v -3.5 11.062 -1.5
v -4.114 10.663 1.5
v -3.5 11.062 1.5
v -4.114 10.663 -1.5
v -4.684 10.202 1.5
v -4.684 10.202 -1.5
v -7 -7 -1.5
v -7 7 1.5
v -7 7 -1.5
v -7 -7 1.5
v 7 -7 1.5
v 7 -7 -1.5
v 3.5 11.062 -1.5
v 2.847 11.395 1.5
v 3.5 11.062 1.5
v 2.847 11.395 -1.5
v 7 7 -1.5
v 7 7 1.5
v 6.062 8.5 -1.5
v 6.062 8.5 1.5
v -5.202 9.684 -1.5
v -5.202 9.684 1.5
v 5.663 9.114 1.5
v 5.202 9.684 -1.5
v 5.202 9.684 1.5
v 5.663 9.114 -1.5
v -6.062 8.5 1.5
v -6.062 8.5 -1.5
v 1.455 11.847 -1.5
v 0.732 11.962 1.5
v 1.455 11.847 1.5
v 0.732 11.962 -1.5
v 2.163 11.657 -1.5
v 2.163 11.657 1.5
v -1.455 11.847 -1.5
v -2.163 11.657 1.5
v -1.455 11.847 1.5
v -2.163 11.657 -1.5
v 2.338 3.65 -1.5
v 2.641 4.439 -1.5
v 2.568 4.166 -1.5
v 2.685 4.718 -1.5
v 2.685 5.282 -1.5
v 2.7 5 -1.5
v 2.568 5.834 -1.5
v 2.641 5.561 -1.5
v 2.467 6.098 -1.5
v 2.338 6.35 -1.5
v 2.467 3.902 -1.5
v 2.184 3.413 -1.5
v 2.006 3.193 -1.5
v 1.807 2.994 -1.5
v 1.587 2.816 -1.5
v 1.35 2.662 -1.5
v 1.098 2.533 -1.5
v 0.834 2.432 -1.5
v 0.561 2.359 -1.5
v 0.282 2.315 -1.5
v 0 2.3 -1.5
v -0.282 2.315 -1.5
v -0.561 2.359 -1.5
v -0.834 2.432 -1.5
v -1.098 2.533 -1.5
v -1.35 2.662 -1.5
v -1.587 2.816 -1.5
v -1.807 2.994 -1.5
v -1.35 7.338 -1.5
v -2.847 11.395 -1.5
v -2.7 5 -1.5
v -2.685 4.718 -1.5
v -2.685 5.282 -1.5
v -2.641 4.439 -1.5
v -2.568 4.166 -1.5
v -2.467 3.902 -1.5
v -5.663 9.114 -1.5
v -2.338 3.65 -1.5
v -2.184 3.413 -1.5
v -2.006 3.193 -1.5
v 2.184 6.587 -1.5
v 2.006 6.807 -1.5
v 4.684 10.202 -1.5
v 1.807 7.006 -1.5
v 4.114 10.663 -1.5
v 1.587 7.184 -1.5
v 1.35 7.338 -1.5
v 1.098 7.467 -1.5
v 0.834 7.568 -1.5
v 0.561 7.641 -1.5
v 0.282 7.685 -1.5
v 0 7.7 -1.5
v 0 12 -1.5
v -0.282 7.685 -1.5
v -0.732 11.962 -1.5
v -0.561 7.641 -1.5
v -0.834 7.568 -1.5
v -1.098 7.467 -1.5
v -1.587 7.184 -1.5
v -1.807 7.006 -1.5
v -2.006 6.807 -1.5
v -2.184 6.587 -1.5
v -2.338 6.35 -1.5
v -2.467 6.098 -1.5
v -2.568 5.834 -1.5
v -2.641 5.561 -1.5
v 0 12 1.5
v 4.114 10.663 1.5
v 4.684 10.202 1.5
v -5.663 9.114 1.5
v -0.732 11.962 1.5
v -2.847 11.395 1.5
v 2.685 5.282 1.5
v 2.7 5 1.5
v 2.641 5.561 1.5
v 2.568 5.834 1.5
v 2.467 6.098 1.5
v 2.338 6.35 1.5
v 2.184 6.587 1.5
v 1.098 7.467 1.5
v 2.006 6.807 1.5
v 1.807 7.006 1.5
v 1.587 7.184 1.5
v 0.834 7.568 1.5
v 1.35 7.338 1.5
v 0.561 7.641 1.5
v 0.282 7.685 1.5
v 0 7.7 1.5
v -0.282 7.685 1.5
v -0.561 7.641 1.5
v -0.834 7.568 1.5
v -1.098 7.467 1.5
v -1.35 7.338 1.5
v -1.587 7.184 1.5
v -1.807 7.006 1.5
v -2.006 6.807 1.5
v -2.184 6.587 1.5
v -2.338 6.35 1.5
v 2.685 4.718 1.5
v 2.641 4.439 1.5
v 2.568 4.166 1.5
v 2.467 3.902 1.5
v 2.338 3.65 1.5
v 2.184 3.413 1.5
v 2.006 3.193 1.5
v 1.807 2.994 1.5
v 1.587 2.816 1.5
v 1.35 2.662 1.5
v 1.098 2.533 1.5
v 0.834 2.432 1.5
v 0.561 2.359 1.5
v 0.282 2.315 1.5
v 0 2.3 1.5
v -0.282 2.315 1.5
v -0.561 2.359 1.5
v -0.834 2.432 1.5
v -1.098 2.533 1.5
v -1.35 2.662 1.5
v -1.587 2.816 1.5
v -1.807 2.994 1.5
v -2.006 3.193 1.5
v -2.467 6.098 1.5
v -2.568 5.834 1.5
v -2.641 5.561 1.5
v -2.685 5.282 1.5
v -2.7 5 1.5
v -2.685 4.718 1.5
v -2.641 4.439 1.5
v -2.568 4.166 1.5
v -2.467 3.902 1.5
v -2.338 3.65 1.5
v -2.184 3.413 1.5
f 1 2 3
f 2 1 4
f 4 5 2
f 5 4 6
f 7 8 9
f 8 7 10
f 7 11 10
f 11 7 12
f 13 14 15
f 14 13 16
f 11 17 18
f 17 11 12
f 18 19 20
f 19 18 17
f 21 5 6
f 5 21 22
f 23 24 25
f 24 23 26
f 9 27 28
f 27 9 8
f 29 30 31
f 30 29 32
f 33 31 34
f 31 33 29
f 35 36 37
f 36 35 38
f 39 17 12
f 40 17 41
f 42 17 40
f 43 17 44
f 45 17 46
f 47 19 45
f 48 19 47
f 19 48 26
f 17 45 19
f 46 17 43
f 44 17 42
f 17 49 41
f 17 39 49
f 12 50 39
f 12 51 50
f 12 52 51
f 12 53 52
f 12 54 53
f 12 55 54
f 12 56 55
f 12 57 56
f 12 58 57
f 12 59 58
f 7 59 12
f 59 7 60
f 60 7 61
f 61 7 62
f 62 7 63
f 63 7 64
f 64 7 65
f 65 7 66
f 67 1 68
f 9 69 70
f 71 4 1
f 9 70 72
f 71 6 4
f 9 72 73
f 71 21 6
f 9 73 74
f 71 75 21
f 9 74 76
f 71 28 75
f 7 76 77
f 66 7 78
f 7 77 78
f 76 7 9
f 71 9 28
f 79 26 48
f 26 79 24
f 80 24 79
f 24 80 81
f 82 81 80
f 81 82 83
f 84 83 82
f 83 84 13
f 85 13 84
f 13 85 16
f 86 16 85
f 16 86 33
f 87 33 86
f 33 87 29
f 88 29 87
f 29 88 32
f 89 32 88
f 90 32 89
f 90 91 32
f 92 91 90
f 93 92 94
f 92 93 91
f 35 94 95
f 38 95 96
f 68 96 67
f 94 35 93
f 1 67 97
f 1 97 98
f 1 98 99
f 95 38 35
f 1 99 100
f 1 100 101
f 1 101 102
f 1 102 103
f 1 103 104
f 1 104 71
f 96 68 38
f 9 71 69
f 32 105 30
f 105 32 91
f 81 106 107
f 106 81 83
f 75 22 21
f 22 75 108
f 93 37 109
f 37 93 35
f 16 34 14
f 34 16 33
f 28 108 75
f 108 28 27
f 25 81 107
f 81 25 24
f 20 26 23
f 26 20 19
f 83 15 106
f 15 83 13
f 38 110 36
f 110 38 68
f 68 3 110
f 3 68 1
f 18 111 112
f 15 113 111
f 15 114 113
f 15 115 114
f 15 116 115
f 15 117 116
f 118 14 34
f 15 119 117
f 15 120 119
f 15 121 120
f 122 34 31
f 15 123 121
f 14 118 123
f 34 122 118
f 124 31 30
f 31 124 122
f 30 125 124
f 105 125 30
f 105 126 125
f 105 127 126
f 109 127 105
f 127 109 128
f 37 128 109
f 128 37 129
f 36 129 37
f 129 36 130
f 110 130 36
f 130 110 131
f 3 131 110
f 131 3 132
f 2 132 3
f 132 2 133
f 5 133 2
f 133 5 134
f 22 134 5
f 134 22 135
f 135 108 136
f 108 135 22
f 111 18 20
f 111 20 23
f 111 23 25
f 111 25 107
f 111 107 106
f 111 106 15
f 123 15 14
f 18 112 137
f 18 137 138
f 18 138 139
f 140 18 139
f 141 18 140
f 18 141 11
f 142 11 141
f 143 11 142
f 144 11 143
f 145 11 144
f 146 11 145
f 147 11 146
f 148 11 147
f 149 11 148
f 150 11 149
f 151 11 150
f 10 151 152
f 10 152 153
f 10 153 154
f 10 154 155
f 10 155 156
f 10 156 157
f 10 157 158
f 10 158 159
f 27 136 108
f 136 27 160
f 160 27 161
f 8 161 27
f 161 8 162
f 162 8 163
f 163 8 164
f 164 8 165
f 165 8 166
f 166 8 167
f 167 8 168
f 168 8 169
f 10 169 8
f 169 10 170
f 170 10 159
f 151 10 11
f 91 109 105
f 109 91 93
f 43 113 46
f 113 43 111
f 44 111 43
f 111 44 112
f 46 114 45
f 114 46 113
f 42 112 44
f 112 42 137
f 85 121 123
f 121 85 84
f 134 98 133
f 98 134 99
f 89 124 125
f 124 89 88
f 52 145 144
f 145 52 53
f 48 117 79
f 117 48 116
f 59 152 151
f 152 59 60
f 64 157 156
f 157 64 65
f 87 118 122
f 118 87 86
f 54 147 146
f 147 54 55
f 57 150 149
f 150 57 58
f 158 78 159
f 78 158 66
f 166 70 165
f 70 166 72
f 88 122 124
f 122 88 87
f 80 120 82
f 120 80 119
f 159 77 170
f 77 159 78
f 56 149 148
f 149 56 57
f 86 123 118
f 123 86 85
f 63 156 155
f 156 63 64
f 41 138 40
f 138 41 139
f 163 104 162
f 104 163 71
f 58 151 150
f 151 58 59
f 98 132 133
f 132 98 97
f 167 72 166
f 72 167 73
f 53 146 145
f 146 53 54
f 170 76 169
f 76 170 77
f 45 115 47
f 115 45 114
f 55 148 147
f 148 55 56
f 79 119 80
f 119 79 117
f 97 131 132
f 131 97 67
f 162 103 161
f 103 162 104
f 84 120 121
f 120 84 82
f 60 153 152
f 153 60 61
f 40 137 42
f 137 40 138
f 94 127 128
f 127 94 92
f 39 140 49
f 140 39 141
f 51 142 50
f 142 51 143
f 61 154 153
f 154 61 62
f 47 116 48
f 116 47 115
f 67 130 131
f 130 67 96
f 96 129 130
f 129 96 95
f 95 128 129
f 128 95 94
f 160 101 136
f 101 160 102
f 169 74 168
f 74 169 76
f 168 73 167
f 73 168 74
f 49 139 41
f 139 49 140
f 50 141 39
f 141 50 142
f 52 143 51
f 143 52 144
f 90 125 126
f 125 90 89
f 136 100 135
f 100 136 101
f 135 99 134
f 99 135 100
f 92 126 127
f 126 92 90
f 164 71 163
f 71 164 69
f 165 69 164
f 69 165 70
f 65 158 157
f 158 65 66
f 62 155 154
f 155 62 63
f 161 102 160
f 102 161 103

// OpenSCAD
// Single-hole mounting tab.
$fn = 60;
eps = 0.02;
tab_w = 14;
tab_h = 24;
tab_t = 3;
difference() {
    hull() { translate([0,0,0]) cube([tab_w,tab_w,tab_t],center=true); translate([0,tab_h/2-tab_w/2,0]) cylinder(d=tab_w,h=tab_t,center=true); }
    translate([0,tab_h/2-tab_w/2,-tab_t/2-eps]) cylinder(d=5.4,h=tab_t+2*eps);
}
